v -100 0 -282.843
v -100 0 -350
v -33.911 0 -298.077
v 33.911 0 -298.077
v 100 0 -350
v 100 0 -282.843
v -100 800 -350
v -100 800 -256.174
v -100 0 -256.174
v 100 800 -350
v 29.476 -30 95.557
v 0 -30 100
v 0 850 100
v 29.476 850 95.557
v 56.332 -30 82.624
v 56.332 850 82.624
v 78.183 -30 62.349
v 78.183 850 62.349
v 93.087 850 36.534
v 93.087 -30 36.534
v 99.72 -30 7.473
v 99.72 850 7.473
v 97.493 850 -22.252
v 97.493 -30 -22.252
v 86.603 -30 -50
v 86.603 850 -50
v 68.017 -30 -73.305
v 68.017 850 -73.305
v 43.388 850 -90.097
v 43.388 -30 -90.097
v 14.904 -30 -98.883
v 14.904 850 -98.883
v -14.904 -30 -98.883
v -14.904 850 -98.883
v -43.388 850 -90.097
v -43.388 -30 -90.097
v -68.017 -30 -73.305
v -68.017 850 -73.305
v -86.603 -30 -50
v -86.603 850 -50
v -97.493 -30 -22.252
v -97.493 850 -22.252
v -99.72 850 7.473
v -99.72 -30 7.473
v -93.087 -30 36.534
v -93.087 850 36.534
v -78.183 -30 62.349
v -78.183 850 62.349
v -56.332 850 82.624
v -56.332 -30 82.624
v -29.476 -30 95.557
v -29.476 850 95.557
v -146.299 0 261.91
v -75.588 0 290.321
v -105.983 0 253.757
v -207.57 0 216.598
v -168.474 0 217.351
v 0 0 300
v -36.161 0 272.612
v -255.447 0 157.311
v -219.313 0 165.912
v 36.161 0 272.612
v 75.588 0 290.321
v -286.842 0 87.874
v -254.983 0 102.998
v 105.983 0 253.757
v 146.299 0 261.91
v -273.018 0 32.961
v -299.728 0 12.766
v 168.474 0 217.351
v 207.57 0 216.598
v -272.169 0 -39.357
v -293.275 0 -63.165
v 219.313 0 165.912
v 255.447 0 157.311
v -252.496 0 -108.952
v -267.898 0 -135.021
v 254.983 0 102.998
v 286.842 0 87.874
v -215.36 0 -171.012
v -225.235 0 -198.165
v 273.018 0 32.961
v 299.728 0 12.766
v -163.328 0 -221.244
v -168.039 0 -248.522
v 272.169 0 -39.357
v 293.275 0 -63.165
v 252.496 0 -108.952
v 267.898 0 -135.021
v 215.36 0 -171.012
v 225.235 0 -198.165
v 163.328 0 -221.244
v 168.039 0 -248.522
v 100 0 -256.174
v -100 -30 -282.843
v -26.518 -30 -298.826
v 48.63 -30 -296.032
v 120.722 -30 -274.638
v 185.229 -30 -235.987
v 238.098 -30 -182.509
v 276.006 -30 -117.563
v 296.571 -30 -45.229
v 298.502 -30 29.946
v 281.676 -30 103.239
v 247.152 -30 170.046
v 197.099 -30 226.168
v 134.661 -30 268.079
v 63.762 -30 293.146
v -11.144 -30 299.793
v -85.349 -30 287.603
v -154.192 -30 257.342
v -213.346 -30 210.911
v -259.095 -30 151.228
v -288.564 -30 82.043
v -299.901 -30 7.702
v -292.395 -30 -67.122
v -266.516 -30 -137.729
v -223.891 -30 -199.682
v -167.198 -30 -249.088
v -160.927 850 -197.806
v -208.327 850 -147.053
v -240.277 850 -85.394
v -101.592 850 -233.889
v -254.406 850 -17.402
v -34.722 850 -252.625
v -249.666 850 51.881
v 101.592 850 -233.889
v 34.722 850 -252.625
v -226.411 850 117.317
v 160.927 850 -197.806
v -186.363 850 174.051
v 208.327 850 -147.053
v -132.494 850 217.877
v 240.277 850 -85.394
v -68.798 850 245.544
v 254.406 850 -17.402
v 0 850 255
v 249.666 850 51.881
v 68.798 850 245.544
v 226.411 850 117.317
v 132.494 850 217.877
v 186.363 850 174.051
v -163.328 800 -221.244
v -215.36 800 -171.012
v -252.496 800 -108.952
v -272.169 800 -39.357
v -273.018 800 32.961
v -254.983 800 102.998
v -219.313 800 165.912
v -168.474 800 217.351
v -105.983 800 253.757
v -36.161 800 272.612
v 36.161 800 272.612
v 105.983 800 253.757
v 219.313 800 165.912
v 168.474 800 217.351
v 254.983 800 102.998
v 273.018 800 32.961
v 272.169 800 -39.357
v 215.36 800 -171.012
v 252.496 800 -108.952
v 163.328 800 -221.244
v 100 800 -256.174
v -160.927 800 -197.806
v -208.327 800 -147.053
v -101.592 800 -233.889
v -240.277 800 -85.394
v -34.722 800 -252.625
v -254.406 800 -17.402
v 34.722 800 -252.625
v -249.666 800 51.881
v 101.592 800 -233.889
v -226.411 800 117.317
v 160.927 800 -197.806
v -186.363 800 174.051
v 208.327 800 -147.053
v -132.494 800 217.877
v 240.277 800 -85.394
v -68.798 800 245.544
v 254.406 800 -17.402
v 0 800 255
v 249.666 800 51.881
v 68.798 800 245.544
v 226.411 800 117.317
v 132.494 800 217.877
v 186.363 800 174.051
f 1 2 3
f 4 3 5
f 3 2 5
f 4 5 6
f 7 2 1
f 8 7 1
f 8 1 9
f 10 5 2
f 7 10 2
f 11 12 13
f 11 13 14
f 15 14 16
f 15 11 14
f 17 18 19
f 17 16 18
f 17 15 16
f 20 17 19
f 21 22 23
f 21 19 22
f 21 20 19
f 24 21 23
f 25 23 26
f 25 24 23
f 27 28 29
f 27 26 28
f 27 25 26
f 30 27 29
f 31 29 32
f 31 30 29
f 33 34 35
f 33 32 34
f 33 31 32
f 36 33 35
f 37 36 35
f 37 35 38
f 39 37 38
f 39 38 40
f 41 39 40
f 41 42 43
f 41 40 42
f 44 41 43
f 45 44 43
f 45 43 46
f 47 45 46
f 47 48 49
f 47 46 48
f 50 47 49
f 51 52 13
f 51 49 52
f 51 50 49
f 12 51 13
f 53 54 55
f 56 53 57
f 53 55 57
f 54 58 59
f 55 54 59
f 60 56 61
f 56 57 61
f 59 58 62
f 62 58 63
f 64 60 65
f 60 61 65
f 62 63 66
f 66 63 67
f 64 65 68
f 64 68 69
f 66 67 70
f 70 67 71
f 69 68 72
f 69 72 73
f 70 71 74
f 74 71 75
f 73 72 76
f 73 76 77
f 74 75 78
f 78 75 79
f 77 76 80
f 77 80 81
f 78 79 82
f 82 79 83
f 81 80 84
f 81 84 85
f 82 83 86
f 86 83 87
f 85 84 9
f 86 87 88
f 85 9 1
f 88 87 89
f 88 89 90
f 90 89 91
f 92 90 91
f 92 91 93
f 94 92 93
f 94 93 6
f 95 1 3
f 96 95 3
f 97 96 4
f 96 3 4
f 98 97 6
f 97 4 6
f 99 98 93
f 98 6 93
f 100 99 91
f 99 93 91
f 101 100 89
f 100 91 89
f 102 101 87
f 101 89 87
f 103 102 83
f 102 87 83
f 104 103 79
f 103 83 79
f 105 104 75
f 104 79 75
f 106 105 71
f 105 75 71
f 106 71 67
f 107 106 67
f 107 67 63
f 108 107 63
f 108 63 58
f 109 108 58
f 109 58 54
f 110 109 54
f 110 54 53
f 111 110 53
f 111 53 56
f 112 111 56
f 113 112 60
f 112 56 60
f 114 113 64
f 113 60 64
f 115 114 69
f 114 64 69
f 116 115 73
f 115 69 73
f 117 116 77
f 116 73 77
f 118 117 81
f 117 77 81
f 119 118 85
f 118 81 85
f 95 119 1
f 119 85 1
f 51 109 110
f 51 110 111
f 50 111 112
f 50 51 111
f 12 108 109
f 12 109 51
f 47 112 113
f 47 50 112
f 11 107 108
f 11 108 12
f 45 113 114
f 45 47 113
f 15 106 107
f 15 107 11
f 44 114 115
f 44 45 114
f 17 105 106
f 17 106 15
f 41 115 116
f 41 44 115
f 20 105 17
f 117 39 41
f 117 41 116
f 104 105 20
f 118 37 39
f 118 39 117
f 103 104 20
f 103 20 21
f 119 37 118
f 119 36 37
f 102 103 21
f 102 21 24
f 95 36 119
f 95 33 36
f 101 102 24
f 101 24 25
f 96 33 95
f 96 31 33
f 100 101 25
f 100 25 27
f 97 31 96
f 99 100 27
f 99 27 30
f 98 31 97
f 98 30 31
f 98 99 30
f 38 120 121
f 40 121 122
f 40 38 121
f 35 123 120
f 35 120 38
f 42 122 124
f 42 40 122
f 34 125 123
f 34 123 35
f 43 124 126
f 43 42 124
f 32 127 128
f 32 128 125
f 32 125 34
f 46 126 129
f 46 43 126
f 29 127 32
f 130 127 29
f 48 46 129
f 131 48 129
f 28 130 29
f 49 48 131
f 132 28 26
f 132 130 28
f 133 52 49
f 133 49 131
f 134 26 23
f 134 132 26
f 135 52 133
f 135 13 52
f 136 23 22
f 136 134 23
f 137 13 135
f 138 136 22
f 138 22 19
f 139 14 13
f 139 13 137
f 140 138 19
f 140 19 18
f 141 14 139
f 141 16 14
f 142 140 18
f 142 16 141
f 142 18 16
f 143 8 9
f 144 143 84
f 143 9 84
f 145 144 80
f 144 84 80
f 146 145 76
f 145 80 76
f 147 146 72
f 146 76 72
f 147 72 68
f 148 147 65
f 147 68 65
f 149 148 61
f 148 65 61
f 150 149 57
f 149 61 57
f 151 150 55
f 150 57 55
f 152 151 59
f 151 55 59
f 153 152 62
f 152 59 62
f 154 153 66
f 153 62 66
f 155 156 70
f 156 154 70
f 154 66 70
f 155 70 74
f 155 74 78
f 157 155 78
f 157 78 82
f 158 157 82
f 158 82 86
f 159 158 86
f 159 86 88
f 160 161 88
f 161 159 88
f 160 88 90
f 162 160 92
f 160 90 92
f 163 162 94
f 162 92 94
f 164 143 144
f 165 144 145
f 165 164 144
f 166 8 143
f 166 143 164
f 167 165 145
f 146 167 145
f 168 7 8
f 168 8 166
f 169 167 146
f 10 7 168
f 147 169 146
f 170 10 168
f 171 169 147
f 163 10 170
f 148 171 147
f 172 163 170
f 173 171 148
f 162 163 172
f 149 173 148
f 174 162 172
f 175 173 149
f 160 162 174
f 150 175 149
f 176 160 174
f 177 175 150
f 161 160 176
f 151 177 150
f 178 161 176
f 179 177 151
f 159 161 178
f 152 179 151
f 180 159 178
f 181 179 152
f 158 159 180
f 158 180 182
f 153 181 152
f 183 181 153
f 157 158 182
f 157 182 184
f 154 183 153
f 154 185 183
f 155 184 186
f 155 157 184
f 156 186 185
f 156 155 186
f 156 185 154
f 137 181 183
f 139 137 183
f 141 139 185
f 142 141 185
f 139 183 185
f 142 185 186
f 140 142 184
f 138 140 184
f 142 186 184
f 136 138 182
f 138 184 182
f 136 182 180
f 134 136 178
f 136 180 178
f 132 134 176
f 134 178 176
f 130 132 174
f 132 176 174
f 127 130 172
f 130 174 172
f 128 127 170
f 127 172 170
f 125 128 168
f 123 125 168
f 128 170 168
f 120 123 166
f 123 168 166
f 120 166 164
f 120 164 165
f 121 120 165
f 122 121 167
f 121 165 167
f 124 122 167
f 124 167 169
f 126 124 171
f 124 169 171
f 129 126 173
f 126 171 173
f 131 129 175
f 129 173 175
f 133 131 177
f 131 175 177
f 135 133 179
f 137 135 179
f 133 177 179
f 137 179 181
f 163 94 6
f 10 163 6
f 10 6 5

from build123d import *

# Parameters (mm, degrees)
SALIENTE_EXTRUIR1_DEPTH    = 800
SALIENTE_EXTRUIR2_DEPTH    = 800
CROQUIS2_R                 = 300
SALIENTE_EXTRUIR3_DEPTH    = 30
CROQUIS7_R                 = 255
SALIENTE_EXTRUIR4_DEPTH    = 50
CORTAR_EXTRUIR1_DEPTH      = 994.428407083
CORTAR_EXTRUIR1_DEPTH_BACK = 994.428407083
CROQUIS8_R                 = 100


with BuildPart() as part:
    # Croquis1 → Saliente-Extruir1 (new body)
    with BuildSketch(Plane(origin=(0, 0, 0), x_dir=(1, 0, 0), z_dir=(0, 1, 0))):
        with BuildLine():
            ThreePointArc((100, 256.173769149), (0, 275), (-100, 256.173769149))
            ThreePointArc((-100, 256.173769149), (-155.120920575, -227.073776557), (275, 0))
            ThreePointArc((275, 0), (227.073776557, 155.120920575), (100, 256.173769149))
        make_face()
    extrude(amount=SALIENTE_EXTRUIR1_DEPTH)

    # Croquis1<3> → Saliente-Extruir2 (add)
    with BuildSketch(Plane(origin=(0, 0, 0), x_dir=(1, 0, 0), z_dir=(0, 1, 0))):
        with BuildLine():
            Line((-100, 350), (-100, 256.173769149))
            ThreePointArc((-100, 256.173769149), (0, 275), (100, 256.173769149))
            Line((100, 256.173769149), (100, 350))
            Line((100, 350), (-100, 350))
        make_face()
    extrude(amount=SALIENTE_EXTRUIR2_DEPTH)

    # Croquis2 → Saliente-Extruir3 (add)
    with BuildSketch(Plane.XZ):
        Circle(CROQUIS2_R)
    extrude(amount=SALIENTE_EXTRUIR3_DEPTH)

    # Croquis7 → Saliente-Extruir4 (add)
    with BuildSketch(Plane(origin=(0, 800, 0), x_dir=(1, 0, 0), z_dir=(0, 1, 0))):
        Circle(CROQUIS7_R)
    extrude(amount=SALIENTE_EXTRUIR4_DEPTH)

    # Croquis8 → Cortar-Extruir1 (cut, two sides: drawn at the far end of the back side and taken through both)
    with BuildSketch(Plane(origin=(0, 850, 0), x_dir=(1, 0, 0), z_dir=(0, 1, 0)).offset(-CORTAR_EXTRUIR1_DEPTH_BACK)):
        Circle(CROQUIS8_R)
    extrude(amount=CORTAR_EXTRUIR1_DEPTH + CORTAR_EXTRUIR1_DEPTH_BACK, mode=Mode.SUBTRACT)


solid = part.part
